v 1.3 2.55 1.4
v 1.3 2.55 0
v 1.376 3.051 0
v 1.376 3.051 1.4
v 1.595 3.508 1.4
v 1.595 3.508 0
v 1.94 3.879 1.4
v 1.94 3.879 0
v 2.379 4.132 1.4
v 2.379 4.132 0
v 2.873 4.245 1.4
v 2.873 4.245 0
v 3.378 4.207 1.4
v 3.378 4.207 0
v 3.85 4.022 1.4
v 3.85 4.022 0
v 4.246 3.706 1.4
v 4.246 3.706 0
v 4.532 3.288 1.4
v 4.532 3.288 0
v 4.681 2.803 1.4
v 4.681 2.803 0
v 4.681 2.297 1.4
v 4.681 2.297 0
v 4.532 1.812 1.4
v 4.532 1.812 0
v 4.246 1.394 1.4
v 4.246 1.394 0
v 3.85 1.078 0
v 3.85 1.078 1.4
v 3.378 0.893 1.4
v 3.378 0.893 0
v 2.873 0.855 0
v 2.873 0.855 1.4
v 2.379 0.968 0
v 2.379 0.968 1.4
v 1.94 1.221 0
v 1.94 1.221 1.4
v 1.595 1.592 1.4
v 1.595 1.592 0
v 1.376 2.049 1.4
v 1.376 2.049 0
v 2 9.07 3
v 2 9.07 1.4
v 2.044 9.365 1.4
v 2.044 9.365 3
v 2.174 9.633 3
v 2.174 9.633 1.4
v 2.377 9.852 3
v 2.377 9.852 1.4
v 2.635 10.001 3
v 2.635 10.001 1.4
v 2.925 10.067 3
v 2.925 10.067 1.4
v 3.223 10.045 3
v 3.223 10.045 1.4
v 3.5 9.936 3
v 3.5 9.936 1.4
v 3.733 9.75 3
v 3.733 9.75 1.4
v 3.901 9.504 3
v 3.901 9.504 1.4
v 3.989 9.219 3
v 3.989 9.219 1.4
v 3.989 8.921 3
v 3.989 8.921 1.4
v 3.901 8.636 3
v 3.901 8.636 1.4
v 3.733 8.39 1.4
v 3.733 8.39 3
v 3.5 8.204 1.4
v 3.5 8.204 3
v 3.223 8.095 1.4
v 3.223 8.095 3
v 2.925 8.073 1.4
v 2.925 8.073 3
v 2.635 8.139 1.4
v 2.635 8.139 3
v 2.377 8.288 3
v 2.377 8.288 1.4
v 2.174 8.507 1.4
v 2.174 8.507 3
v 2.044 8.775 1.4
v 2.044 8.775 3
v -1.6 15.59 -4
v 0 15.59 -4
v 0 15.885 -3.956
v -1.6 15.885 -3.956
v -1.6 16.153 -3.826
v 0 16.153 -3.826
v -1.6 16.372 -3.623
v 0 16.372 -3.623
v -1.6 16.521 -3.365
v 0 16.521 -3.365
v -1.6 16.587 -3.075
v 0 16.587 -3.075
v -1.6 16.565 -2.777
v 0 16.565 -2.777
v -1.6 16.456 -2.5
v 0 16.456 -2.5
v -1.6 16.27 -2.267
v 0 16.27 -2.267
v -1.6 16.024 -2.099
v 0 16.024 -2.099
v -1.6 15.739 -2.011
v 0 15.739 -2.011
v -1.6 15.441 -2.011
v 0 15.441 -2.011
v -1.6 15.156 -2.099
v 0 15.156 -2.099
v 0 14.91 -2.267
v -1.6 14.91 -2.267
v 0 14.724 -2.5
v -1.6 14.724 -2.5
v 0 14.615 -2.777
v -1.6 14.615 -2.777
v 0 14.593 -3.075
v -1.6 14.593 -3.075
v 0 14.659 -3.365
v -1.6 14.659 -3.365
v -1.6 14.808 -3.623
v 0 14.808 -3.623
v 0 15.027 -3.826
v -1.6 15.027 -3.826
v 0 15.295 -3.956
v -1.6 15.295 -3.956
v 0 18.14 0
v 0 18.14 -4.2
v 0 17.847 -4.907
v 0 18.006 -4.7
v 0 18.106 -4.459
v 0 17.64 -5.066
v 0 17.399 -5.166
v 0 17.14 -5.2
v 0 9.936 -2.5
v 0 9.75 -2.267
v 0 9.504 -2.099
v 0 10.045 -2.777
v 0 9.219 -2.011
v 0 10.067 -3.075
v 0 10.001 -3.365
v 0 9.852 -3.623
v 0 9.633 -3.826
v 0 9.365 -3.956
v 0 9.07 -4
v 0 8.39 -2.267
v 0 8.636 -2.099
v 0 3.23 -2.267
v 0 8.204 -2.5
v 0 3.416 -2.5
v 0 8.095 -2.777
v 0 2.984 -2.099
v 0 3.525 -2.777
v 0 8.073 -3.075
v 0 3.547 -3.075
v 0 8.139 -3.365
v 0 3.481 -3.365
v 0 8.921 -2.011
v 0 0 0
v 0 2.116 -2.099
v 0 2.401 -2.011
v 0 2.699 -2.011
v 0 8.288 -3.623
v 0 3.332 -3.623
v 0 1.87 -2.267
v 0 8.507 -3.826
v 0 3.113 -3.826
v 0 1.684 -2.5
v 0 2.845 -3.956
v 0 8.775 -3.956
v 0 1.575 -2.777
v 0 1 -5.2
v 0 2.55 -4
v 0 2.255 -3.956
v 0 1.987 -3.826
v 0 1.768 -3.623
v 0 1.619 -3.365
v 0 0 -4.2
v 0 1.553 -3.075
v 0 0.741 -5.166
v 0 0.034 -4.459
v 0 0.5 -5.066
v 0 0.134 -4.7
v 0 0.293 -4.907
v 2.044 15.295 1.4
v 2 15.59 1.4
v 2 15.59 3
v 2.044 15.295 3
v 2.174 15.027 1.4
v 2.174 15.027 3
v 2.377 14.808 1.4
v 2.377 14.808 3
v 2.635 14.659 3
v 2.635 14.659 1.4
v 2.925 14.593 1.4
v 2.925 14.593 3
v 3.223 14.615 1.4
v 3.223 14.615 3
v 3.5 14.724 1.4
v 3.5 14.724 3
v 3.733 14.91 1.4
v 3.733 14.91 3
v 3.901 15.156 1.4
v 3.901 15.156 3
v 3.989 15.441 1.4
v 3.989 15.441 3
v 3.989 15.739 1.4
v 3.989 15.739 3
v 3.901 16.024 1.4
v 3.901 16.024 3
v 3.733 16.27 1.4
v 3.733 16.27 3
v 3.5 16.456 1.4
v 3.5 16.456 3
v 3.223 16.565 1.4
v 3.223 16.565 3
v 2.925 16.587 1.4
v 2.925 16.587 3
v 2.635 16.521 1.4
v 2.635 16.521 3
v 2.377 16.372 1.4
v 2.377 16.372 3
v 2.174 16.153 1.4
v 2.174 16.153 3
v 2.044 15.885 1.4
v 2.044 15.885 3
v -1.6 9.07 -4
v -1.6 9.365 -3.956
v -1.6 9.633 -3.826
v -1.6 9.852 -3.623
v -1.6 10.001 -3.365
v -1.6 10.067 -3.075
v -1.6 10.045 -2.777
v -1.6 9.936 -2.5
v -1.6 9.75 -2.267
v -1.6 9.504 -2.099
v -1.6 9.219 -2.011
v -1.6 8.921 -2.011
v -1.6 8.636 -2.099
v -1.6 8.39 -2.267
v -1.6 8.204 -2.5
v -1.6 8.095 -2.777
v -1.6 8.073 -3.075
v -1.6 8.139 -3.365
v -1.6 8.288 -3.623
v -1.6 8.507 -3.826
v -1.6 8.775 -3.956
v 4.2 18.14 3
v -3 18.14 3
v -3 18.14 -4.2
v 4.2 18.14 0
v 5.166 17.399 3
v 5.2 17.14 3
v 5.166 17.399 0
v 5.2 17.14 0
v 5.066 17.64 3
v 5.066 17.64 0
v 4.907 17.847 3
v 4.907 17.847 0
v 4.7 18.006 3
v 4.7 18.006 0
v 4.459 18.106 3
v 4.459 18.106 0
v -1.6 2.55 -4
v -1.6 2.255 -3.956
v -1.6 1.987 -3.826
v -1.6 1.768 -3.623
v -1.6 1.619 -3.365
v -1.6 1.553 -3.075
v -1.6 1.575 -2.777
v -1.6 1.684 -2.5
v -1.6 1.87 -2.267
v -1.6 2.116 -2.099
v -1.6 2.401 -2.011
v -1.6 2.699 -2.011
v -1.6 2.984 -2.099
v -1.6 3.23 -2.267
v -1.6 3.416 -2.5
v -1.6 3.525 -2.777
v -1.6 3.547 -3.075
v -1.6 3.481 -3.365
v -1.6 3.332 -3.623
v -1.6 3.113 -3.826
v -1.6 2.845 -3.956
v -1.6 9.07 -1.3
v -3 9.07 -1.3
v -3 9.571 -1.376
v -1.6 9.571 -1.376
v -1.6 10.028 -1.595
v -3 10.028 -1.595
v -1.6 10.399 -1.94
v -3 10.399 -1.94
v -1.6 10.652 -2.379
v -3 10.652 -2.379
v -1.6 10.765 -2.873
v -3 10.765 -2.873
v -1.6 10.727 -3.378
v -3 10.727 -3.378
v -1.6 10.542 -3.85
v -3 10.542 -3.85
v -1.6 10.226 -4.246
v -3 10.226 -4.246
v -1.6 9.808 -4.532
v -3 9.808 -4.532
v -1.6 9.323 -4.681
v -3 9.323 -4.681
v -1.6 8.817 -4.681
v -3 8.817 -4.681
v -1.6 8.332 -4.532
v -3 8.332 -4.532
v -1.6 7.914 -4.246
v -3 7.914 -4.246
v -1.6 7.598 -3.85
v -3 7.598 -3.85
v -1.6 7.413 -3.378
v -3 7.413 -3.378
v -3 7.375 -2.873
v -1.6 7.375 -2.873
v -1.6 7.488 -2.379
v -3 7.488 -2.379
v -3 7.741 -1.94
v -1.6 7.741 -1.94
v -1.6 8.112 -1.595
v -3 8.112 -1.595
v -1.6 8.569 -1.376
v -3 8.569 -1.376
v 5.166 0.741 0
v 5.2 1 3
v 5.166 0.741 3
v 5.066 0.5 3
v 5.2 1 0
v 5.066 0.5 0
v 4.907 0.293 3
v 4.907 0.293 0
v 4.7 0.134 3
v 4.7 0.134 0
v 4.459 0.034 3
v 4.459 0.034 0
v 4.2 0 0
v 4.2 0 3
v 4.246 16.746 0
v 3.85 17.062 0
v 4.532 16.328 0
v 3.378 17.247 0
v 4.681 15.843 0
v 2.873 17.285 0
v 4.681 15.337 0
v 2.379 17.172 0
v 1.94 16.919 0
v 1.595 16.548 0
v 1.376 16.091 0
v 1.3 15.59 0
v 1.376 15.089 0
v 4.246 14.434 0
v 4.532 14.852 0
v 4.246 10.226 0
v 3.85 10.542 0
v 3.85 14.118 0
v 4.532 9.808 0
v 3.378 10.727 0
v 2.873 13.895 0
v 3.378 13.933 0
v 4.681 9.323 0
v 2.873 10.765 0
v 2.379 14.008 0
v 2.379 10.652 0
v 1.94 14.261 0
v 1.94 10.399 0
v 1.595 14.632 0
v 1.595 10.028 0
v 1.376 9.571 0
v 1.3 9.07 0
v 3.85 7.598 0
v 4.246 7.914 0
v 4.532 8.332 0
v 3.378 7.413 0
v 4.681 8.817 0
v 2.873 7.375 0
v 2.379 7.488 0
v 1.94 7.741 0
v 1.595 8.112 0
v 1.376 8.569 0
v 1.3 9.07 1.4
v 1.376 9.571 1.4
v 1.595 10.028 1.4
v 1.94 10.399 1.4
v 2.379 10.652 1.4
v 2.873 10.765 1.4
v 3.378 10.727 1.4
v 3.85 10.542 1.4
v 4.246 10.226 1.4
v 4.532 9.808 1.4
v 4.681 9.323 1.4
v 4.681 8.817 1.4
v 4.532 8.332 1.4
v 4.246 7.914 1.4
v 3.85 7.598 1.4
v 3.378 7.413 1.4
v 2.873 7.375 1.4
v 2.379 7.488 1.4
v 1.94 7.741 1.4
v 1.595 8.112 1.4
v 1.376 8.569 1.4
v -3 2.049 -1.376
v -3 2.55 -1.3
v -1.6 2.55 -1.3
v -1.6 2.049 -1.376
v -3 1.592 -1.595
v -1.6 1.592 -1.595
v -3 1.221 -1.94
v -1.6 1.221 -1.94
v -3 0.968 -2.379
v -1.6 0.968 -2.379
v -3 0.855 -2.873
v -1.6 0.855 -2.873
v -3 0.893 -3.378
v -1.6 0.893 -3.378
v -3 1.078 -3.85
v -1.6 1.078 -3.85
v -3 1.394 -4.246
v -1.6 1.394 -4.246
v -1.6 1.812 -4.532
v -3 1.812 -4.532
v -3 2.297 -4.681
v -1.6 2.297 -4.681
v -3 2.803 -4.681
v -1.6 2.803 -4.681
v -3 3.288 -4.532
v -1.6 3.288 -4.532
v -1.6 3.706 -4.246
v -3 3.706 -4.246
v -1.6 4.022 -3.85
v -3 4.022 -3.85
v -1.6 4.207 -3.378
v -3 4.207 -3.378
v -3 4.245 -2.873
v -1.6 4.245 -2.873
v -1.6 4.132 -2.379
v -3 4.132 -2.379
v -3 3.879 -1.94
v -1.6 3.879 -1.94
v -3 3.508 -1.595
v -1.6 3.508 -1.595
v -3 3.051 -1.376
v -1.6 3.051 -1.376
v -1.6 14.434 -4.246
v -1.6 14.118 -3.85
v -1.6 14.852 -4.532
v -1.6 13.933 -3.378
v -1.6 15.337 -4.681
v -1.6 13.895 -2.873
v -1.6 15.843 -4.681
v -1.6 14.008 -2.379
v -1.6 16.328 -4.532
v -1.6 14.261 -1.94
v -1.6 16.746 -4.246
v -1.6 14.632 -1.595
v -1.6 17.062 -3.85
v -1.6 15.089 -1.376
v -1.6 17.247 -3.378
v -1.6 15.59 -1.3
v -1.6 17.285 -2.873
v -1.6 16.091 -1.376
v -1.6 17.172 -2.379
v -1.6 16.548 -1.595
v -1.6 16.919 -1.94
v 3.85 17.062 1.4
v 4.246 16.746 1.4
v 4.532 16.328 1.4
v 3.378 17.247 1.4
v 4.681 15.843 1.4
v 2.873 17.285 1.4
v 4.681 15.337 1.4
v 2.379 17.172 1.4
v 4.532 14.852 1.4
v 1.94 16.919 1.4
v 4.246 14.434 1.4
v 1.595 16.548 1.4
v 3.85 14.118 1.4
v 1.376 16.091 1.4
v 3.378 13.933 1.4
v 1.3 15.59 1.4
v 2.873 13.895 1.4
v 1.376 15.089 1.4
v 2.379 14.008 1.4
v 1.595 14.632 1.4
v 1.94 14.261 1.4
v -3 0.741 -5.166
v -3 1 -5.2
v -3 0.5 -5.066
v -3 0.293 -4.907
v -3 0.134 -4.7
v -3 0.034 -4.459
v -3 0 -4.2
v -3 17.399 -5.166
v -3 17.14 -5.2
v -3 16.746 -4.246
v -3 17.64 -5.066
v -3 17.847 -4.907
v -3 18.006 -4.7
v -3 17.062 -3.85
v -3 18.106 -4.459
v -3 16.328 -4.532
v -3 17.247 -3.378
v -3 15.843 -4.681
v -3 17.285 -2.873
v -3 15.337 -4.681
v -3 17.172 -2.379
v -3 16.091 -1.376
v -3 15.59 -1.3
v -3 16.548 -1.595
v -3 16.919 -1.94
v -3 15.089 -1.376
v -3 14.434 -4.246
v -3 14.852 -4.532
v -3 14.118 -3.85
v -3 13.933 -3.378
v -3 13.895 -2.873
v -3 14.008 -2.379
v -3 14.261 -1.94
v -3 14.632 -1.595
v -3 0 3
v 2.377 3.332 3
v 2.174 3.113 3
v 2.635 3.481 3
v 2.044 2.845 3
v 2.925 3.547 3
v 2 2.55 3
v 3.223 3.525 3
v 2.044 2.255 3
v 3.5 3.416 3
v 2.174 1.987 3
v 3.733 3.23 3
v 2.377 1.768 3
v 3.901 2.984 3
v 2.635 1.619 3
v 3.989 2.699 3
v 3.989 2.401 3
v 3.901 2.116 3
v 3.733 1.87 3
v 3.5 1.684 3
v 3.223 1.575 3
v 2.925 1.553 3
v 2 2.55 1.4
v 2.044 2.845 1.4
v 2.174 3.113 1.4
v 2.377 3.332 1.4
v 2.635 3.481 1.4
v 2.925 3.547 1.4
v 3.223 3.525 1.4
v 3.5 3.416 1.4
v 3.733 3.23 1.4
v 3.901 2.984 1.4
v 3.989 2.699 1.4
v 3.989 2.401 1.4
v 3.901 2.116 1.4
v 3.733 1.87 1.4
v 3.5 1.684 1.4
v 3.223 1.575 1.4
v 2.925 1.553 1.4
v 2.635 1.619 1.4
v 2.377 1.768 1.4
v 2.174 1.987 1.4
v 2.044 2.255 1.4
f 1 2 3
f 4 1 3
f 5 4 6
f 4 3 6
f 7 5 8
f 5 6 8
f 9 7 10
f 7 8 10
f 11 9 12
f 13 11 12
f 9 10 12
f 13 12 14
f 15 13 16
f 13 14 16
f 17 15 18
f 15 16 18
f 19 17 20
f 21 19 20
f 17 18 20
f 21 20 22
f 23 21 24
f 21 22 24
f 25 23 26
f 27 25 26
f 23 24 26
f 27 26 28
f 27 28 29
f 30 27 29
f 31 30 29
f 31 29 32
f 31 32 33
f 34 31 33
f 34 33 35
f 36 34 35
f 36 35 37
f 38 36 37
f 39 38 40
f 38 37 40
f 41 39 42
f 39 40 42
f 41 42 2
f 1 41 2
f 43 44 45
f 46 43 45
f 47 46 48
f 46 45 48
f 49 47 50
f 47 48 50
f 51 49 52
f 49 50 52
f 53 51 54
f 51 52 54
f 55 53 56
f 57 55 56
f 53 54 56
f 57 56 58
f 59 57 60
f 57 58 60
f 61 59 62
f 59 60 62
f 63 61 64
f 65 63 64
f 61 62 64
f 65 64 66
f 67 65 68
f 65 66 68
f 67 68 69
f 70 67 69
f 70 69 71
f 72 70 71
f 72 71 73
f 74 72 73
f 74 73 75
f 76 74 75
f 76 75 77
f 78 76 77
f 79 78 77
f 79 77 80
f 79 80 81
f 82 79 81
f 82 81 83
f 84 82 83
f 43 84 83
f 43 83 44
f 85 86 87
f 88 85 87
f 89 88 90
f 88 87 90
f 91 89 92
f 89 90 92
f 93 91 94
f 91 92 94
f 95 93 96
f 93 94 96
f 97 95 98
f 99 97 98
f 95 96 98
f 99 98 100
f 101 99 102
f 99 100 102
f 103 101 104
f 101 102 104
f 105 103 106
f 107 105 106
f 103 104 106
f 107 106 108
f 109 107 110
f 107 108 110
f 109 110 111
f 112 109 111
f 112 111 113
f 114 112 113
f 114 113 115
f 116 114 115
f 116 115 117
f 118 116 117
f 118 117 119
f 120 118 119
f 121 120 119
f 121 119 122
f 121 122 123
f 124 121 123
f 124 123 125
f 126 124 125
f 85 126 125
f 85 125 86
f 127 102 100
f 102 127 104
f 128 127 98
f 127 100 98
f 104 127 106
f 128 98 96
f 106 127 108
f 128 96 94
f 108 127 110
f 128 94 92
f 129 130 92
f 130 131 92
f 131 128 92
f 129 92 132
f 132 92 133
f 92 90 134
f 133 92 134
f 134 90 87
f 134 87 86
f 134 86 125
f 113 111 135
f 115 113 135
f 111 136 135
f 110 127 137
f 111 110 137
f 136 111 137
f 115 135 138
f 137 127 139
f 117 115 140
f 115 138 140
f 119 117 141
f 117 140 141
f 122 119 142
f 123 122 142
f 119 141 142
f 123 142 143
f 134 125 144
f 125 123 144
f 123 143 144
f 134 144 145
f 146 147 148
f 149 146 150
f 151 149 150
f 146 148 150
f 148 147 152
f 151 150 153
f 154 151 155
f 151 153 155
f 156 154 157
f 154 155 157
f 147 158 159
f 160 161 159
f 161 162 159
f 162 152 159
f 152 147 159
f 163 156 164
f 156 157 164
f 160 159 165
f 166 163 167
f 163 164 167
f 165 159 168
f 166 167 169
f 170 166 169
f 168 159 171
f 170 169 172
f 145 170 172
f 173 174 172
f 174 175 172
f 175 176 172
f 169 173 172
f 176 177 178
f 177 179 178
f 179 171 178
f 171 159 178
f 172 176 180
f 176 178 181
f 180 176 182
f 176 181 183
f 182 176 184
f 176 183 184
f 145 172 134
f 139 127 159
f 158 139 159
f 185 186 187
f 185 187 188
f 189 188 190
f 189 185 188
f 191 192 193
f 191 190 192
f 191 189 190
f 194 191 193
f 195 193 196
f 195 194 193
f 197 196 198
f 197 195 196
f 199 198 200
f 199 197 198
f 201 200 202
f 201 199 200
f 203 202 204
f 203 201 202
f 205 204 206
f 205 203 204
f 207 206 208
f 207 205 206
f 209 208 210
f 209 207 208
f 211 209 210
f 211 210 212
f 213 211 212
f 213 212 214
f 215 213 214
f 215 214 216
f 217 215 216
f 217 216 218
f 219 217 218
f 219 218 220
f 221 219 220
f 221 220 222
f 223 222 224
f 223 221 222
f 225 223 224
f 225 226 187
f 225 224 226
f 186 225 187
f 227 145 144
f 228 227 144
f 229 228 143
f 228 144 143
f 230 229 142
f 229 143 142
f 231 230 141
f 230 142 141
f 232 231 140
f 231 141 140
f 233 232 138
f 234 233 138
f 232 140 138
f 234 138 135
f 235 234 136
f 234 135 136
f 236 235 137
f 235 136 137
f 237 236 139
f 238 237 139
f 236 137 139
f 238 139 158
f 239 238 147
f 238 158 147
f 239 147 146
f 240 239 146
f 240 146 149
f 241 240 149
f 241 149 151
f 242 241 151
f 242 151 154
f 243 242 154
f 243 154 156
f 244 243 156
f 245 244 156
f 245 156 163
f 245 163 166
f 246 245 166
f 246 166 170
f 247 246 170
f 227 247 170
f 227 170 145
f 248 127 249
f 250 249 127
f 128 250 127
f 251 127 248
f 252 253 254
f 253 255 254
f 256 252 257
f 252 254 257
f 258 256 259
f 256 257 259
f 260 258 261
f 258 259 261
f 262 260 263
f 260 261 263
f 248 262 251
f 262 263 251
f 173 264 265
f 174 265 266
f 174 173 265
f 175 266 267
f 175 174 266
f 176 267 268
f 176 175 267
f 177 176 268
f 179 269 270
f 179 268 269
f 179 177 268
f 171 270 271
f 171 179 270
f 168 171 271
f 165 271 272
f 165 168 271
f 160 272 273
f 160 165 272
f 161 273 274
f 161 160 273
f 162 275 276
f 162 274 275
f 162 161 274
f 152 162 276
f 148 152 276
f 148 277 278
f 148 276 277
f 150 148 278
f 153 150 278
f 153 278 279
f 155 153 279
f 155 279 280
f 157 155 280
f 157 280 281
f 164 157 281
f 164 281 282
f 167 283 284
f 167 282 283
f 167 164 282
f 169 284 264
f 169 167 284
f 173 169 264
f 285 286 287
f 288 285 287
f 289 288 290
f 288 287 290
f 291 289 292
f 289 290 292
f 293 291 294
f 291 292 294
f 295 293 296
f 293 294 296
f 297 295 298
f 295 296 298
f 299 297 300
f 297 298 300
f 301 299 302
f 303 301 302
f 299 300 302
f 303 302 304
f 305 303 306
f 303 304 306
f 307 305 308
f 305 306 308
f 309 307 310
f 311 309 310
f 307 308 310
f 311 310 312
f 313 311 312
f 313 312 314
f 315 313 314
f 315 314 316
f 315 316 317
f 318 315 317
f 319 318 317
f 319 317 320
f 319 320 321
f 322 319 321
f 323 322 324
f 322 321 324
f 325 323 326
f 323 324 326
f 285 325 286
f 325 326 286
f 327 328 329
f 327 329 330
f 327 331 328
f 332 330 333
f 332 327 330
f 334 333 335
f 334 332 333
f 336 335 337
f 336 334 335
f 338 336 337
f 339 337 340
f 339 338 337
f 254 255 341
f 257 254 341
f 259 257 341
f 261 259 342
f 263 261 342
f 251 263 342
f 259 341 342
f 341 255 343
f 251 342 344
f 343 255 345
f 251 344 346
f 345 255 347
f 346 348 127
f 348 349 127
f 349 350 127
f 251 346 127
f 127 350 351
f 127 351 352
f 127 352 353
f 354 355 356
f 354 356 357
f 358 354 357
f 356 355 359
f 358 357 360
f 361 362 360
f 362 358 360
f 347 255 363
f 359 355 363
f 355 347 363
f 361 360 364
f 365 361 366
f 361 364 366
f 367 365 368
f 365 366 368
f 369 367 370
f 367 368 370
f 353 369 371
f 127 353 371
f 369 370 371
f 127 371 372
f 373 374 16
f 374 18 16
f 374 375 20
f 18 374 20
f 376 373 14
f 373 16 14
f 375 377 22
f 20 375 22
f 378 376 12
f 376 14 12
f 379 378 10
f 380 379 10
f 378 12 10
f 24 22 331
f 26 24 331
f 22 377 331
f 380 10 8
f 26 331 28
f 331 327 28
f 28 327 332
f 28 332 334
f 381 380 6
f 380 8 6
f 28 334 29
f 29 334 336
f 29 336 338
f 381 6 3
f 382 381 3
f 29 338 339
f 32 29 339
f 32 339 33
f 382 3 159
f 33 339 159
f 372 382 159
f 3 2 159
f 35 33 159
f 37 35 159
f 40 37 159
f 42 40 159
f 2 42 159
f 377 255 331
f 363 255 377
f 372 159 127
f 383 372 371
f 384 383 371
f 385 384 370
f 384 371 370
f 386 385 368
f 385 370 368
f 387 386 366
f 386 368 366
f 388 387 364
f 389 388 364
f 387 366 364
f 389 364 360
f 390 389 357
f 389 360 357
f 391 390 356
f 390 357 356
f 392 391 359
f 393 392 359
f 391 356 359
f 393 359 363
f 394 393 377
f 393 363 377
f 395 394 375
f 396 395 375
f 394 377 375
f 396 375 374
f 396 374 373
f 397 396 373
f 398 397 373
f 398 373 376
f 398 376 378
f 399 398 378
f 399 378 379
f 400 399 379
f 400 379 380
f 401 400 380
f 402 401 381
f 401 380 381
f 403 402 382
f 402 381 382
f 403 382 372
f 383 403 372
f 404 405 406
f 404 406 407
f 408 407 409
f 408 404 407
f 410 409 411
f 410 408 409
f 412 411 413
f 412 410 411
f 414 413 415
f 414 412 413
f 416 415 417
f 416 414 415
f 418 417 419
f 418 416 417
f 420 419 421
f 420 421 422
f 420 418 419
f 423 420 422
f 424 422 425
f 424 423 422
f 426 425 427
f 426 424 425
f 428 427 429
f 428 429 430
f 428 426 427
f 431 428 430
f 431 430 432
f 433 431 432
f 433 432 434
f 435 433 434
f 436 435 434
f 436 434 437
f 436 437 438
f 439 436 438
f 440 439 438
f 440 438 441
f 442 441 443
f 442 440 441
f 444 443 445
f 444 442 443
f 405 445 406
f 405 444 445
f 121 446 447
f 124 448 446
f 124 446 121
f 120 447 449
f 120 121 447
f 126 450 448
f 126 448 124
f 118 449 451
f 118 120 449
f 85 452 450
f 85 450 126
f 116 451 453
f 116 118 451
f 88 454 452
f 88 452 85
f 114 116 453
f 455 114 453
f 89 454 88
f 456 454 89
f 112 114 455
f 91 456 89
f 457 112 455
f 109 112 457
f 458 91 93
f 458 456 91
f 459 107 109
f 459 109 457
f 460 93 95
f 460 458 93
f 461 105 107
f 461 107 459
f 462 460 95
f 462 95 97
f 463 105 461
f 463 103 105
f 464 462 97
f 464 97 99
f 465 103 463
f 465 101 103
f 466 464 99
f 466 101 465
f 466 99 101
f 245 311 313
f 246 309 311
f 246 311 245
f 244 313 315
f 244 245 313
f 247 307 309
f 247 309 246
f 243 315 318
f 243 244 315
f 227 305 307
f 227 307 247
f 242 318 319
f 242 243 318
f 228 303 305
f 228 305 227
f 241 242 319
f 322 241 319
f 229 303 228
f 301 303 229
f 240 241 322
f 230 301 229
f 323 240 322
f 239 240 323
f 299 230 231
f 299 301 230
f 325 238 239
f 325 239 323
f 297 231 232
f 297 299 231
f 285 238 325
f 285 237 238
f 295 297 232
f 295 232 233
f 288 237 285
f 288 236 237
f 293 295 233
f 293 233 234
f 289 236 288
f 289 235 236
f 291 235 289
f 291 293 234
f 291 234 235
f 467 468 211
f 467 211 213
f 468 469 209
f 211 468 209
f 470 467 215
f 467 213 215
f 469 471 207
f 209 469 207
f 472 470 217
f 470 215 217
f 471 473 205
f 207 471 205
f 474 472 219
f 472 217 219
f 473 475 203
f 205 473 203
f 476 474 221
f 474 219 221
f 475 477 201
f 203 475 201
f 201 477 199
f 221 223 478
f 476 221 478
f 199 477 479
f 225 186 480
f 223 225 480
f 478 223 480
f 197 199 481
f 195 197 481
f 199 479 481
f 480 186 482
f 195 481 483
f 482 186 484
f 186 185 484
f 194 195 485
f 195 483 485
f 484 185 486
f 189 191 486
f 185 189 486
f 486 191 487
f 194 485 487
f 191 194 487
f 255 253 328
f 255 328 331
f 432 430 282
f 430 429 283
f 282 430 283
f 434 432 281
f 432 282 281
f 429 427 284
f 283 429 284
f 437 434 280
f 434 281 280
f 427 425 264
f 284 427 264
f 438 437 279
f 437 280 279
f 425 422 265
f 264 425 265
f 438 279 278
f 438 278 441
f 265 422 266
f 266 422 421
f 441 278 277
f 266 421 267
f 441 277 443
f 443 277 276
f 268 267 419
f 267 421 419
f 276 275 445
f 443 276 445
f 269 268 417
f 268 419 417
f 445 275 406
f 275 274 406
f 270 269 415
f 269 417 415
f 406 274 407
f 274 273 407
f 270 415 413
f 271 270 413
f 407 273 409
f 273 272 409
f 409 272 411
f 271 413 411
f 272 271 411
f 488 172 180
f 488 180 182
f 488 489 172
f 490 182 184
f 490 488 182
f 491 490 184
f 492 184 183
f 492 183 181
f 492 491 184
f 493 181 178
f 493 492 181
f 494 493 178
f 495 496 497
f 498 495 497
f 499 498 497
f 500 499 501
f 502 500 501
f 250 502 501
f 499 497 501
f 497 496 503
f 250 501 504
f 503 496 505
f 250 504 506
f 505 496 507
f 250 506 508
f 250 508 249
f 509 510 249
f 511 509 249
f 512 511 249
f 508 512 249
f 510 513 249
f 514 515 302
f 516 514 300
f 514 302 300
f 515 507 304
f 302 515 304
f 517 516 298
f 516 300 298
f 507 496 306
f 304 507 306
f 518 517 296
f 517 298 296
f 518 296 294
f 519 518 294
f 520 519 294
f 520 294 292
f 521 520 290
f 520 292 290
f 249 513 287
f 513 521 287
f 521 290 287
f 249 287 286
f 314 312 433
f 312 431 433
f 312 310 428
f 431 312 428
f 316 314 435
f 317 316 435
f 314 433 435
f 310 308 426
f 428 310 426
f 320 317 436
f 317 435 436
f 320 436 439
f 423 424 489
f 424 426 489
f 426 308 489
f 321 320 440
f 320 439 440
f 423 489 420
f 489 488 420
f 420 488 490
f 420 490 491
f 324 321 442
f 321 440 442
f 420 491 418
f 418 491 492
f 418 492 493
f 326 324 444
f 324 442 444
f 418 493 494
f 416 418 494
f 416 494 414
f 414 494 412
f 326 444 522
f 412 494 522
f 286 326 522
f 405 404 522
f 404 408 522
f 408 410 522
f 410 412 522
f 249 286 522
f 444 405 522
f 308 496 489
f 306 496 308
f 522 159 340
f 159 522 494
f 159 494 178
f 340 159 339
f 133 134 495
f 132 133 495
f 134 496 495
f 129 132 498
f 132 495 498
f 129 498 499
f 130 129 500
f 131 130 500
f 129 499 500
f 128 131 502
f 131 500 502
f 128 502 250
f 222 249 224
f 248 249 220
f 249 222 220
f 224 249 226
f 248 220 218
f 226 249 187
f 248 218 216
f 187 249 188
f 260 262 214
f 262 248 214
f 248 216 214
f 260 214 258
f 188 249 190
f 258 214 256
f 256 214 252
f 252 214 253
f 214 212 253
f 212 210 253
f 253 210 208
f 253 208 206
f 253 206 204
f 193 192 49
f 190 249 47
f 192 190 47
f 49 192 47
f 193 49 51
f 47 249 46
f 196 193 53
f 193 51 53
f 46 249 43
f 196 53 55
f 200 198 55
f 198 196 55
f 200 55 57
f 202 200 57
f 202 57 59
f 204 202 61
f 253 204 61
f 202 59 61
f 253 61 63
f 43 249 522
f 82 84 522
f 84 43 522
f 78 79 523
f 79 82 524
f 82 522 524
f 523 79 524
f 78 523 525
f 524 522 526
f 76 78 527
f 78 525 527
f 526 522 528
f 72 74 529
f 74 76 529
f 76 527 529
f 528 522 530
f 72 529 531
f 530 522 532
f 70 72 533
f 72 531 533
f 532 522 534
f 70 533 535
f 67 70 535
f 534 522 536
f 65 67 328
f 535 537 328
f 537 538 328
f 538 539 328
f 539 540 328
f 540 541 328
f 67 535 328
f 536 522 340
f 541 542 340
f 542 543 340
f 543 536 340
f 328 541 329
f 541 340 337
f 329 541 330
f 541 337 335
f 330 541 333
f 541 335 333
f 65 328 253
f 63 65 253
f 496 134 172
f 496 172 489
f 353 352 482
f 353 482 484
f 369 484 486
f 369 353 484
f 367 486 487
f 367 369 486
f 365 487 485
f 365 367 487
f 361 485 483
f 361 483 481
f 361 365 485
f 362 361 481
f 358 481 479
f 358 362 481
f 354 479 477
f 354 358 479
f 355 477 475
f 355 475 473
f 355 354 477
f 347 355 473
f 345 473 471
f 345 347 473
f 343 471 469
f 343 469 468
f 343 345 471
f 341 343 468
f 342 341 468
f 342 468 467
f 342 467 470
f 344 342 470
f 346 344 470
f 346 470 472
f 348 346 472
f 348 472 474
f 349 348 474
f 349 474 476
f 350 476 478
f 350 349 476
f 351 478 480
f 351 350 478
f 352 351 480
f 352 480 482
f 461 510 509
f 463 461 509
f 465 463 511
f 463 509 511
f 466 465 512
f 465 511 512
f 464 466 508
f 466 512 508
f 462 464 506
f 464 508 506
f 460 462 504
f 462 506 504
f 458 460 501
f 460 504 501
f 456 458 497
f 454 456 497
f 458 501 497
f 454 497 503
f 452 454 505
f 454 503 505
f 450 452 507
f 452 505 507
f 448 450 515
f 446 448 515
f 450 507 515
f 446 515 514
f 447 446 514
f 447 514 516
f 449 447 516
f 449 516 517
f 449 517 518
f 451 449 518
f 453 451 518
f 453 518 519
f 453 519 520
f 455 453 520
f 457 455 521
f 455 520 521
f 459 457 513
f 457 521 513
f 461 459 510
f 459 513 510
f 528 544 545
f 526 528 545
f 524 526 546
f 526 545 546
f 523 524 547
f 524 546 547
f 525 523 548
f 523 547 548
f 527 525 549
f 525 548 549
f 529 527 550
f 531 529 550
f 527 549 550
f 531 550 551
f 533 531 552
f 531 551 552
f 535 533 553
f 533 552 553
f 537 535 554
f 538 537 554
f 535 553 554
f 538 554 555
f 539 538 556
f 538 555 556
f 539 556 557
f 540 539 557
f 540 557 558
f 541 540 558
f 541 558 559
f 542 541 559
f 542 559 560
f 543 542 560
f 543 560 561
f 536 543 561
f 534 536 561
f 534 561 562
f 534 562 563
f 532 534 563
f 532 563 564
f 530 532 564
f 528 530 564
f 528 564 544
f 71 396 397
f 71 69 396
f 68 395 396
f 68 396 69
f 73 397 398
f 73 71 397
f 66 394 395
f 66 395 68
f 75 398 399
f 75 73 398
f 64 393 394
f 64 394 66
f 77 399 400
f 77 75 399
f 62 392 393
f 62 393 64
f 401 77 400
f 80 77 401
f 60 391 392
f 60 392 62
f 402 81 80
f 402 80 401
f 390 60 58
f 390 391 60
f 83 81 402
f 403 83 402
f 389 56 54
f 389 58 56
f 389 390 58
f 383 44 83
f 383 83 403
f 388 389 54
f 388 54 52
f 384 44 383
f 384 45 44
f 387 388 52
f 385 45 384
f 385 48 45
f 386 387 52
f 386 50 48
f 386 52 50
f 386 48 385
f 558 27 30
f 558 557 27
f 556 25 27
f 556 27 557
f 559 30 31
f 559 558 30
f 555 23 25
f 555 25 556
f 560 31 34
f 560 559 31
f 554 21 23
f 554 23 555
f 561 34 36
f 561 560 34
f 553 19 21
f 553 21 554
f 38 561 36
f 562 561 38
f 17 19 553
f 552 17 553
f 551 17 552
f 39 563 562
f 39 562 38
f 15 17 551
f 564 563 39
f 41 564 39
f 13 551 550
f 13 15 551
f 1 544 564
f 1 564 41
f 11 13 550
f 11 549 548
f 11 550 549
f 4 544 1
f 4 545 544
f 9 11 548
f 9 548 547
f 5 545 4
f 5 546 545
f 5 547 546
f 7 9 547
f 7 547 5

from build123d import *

# Parameters (mm, degrees)
BOSS_EXTRUDE1_DEPTH = 18.14
FILLET1_R           = 1
SKETCH3_R           = 1
CUT_EXTRUDE1_DEPTH  = 5.1
SKETCH4_R           = 1
CUT_EXTRUDE2_DEPTH  = 5.1
SKETCH5_R           = 1.7
CUT_EXTRUDE3_DEPTH  = 1.4
SKETCH6_R           = 1.7
CUT_EXTRUDE4_DEPTH  = 1.4
LPATTERN1_COUNT     = 2
LPATTERN1_PITCH     = 6.52
LPATTERN2_COUNT     = 2
LPATTERN2_PITCH     = 6.52


with BuildPart() as part:
    # Sketch1 → Boss-Extrude1 (new body)
    with BuildSketch(Plane(origin=(0, 0, 0), x_dir=(1, 0, 0), z_dir=(0, 1, 0))):
        Polygon((0, 0), (0, 5.2), (-3, 5.2), (-3, -3), (5.2, -3), (5.2, 0), align=None)
    extrude(amount=BOSS_EXTRUDE1_DEPTH)

    # Fillet1
    fillet1_edges = [part.edges().sort_by_distance(p)[0] for p in [
        (-1.5, 18.14, -5.2),
        (5.2, 18.14, 1.5),
        (5.2, 0, 1.5),
        (-1.5, 0, -5.2),
    ]]
    fillet(fillet1_edges, radius=FILLET1_R)

    # Sketch3 → Cut-Extrude1 (cut)
    with BuildSketch(Plane(origin=(0, 0, 0), x_dir=(0, 0, -1), z_dir=(1, 0, 0))):
        with Locations((3, 15.59)):
            Circle(SKETCH3_R)
    cut_extrude1 = extrude(amount=-CUT_EXTRUDE1_DEPTH, mode=Mode.SUBTRACT)

    # Sketch4 → Cut-Extrude2 (cut)
    with BuildSketch(Plane(origin=(0, 0, 0), x_dir=(-1, 0, 0), z_dir=(0, 0, -1))):
        with Locations((-3, 2.55)):
            Circle(SKETCH4_R)
    cut_extrude2 = extrude(amount=-CUT_EXTRUDE2_DEPTH, mode=Mode.SUBTRACT)

    # Sketch5 → Cut-Extrude3 (cut)
    with BuildSketch(Plane(origin=(0, 0, 0), x_dir=(-1, 0, 0), z_dir=(0, 0, -1))):
        with Locations((-3, 2.55)):
            Circle(SKETCH5_R)
    cut_extrude3 = extrude(amount=-CUT_EXTRUDE3_DEPTH, mode=Mode.SUBTRACT)

    # Sketch6 → Cut-Extrude4 (cut)
    with BuildSketch(Plane.ZY.offset(3)):
        with Locations((-3, 15.59)):
            Circle(SKETCH6_R)
    cut_extrude4 = extrude(amount=-CUT_EXTRUDE4_DEPTH, mode=Mode.SUBTRACT)

    # Mirror2: Cut-Extrude1, Cut-Extrude2, Cut-Extrude3, Cut-Extrude4 across plane
    add(cut_extrude1.mirror(Plane.ZX.offset(9.07)), mode=Mode.SUBTRACT)
    add(cut_extrude2.mirror(Plane.ZX.offset(9.07)), mode=Mode.SUBTRACT)
    add(cut_extrude3.mirror(Plane.ZX.offset(9.07)), mode=Mode.SUBTRACT)
    add(cut_extrude4.mirror(Plane.ZX.offset(9.07)), mode=Mode.SUBTRACT)

    # LPattern1: Cut-Extrude1, Cut-Extrude4 ×2
    with Locations(*[(0, -i * LPATTERN1_PITCH, 0) for i in range(1, LPATTERN1_COUNT)]):
        add(cut_extrude1, mode=Mode.SUBTRACT)
        add(cut_extrude4, mode=Mode.SUBTRACT)

    # LPattern2: Cut-Extrude2, Cut-Extrude3 ×2
    with Locations(*[(0, i * LPATTERN2_PITCH, 0) for i in range(1, LPATTERN2_COUNT)]):
        add(cut_extrude2, mode=Mode.SUBTRACT)
        add(cut_extrude3, mode=Mode.SUBTRACT)


solid = part.part
